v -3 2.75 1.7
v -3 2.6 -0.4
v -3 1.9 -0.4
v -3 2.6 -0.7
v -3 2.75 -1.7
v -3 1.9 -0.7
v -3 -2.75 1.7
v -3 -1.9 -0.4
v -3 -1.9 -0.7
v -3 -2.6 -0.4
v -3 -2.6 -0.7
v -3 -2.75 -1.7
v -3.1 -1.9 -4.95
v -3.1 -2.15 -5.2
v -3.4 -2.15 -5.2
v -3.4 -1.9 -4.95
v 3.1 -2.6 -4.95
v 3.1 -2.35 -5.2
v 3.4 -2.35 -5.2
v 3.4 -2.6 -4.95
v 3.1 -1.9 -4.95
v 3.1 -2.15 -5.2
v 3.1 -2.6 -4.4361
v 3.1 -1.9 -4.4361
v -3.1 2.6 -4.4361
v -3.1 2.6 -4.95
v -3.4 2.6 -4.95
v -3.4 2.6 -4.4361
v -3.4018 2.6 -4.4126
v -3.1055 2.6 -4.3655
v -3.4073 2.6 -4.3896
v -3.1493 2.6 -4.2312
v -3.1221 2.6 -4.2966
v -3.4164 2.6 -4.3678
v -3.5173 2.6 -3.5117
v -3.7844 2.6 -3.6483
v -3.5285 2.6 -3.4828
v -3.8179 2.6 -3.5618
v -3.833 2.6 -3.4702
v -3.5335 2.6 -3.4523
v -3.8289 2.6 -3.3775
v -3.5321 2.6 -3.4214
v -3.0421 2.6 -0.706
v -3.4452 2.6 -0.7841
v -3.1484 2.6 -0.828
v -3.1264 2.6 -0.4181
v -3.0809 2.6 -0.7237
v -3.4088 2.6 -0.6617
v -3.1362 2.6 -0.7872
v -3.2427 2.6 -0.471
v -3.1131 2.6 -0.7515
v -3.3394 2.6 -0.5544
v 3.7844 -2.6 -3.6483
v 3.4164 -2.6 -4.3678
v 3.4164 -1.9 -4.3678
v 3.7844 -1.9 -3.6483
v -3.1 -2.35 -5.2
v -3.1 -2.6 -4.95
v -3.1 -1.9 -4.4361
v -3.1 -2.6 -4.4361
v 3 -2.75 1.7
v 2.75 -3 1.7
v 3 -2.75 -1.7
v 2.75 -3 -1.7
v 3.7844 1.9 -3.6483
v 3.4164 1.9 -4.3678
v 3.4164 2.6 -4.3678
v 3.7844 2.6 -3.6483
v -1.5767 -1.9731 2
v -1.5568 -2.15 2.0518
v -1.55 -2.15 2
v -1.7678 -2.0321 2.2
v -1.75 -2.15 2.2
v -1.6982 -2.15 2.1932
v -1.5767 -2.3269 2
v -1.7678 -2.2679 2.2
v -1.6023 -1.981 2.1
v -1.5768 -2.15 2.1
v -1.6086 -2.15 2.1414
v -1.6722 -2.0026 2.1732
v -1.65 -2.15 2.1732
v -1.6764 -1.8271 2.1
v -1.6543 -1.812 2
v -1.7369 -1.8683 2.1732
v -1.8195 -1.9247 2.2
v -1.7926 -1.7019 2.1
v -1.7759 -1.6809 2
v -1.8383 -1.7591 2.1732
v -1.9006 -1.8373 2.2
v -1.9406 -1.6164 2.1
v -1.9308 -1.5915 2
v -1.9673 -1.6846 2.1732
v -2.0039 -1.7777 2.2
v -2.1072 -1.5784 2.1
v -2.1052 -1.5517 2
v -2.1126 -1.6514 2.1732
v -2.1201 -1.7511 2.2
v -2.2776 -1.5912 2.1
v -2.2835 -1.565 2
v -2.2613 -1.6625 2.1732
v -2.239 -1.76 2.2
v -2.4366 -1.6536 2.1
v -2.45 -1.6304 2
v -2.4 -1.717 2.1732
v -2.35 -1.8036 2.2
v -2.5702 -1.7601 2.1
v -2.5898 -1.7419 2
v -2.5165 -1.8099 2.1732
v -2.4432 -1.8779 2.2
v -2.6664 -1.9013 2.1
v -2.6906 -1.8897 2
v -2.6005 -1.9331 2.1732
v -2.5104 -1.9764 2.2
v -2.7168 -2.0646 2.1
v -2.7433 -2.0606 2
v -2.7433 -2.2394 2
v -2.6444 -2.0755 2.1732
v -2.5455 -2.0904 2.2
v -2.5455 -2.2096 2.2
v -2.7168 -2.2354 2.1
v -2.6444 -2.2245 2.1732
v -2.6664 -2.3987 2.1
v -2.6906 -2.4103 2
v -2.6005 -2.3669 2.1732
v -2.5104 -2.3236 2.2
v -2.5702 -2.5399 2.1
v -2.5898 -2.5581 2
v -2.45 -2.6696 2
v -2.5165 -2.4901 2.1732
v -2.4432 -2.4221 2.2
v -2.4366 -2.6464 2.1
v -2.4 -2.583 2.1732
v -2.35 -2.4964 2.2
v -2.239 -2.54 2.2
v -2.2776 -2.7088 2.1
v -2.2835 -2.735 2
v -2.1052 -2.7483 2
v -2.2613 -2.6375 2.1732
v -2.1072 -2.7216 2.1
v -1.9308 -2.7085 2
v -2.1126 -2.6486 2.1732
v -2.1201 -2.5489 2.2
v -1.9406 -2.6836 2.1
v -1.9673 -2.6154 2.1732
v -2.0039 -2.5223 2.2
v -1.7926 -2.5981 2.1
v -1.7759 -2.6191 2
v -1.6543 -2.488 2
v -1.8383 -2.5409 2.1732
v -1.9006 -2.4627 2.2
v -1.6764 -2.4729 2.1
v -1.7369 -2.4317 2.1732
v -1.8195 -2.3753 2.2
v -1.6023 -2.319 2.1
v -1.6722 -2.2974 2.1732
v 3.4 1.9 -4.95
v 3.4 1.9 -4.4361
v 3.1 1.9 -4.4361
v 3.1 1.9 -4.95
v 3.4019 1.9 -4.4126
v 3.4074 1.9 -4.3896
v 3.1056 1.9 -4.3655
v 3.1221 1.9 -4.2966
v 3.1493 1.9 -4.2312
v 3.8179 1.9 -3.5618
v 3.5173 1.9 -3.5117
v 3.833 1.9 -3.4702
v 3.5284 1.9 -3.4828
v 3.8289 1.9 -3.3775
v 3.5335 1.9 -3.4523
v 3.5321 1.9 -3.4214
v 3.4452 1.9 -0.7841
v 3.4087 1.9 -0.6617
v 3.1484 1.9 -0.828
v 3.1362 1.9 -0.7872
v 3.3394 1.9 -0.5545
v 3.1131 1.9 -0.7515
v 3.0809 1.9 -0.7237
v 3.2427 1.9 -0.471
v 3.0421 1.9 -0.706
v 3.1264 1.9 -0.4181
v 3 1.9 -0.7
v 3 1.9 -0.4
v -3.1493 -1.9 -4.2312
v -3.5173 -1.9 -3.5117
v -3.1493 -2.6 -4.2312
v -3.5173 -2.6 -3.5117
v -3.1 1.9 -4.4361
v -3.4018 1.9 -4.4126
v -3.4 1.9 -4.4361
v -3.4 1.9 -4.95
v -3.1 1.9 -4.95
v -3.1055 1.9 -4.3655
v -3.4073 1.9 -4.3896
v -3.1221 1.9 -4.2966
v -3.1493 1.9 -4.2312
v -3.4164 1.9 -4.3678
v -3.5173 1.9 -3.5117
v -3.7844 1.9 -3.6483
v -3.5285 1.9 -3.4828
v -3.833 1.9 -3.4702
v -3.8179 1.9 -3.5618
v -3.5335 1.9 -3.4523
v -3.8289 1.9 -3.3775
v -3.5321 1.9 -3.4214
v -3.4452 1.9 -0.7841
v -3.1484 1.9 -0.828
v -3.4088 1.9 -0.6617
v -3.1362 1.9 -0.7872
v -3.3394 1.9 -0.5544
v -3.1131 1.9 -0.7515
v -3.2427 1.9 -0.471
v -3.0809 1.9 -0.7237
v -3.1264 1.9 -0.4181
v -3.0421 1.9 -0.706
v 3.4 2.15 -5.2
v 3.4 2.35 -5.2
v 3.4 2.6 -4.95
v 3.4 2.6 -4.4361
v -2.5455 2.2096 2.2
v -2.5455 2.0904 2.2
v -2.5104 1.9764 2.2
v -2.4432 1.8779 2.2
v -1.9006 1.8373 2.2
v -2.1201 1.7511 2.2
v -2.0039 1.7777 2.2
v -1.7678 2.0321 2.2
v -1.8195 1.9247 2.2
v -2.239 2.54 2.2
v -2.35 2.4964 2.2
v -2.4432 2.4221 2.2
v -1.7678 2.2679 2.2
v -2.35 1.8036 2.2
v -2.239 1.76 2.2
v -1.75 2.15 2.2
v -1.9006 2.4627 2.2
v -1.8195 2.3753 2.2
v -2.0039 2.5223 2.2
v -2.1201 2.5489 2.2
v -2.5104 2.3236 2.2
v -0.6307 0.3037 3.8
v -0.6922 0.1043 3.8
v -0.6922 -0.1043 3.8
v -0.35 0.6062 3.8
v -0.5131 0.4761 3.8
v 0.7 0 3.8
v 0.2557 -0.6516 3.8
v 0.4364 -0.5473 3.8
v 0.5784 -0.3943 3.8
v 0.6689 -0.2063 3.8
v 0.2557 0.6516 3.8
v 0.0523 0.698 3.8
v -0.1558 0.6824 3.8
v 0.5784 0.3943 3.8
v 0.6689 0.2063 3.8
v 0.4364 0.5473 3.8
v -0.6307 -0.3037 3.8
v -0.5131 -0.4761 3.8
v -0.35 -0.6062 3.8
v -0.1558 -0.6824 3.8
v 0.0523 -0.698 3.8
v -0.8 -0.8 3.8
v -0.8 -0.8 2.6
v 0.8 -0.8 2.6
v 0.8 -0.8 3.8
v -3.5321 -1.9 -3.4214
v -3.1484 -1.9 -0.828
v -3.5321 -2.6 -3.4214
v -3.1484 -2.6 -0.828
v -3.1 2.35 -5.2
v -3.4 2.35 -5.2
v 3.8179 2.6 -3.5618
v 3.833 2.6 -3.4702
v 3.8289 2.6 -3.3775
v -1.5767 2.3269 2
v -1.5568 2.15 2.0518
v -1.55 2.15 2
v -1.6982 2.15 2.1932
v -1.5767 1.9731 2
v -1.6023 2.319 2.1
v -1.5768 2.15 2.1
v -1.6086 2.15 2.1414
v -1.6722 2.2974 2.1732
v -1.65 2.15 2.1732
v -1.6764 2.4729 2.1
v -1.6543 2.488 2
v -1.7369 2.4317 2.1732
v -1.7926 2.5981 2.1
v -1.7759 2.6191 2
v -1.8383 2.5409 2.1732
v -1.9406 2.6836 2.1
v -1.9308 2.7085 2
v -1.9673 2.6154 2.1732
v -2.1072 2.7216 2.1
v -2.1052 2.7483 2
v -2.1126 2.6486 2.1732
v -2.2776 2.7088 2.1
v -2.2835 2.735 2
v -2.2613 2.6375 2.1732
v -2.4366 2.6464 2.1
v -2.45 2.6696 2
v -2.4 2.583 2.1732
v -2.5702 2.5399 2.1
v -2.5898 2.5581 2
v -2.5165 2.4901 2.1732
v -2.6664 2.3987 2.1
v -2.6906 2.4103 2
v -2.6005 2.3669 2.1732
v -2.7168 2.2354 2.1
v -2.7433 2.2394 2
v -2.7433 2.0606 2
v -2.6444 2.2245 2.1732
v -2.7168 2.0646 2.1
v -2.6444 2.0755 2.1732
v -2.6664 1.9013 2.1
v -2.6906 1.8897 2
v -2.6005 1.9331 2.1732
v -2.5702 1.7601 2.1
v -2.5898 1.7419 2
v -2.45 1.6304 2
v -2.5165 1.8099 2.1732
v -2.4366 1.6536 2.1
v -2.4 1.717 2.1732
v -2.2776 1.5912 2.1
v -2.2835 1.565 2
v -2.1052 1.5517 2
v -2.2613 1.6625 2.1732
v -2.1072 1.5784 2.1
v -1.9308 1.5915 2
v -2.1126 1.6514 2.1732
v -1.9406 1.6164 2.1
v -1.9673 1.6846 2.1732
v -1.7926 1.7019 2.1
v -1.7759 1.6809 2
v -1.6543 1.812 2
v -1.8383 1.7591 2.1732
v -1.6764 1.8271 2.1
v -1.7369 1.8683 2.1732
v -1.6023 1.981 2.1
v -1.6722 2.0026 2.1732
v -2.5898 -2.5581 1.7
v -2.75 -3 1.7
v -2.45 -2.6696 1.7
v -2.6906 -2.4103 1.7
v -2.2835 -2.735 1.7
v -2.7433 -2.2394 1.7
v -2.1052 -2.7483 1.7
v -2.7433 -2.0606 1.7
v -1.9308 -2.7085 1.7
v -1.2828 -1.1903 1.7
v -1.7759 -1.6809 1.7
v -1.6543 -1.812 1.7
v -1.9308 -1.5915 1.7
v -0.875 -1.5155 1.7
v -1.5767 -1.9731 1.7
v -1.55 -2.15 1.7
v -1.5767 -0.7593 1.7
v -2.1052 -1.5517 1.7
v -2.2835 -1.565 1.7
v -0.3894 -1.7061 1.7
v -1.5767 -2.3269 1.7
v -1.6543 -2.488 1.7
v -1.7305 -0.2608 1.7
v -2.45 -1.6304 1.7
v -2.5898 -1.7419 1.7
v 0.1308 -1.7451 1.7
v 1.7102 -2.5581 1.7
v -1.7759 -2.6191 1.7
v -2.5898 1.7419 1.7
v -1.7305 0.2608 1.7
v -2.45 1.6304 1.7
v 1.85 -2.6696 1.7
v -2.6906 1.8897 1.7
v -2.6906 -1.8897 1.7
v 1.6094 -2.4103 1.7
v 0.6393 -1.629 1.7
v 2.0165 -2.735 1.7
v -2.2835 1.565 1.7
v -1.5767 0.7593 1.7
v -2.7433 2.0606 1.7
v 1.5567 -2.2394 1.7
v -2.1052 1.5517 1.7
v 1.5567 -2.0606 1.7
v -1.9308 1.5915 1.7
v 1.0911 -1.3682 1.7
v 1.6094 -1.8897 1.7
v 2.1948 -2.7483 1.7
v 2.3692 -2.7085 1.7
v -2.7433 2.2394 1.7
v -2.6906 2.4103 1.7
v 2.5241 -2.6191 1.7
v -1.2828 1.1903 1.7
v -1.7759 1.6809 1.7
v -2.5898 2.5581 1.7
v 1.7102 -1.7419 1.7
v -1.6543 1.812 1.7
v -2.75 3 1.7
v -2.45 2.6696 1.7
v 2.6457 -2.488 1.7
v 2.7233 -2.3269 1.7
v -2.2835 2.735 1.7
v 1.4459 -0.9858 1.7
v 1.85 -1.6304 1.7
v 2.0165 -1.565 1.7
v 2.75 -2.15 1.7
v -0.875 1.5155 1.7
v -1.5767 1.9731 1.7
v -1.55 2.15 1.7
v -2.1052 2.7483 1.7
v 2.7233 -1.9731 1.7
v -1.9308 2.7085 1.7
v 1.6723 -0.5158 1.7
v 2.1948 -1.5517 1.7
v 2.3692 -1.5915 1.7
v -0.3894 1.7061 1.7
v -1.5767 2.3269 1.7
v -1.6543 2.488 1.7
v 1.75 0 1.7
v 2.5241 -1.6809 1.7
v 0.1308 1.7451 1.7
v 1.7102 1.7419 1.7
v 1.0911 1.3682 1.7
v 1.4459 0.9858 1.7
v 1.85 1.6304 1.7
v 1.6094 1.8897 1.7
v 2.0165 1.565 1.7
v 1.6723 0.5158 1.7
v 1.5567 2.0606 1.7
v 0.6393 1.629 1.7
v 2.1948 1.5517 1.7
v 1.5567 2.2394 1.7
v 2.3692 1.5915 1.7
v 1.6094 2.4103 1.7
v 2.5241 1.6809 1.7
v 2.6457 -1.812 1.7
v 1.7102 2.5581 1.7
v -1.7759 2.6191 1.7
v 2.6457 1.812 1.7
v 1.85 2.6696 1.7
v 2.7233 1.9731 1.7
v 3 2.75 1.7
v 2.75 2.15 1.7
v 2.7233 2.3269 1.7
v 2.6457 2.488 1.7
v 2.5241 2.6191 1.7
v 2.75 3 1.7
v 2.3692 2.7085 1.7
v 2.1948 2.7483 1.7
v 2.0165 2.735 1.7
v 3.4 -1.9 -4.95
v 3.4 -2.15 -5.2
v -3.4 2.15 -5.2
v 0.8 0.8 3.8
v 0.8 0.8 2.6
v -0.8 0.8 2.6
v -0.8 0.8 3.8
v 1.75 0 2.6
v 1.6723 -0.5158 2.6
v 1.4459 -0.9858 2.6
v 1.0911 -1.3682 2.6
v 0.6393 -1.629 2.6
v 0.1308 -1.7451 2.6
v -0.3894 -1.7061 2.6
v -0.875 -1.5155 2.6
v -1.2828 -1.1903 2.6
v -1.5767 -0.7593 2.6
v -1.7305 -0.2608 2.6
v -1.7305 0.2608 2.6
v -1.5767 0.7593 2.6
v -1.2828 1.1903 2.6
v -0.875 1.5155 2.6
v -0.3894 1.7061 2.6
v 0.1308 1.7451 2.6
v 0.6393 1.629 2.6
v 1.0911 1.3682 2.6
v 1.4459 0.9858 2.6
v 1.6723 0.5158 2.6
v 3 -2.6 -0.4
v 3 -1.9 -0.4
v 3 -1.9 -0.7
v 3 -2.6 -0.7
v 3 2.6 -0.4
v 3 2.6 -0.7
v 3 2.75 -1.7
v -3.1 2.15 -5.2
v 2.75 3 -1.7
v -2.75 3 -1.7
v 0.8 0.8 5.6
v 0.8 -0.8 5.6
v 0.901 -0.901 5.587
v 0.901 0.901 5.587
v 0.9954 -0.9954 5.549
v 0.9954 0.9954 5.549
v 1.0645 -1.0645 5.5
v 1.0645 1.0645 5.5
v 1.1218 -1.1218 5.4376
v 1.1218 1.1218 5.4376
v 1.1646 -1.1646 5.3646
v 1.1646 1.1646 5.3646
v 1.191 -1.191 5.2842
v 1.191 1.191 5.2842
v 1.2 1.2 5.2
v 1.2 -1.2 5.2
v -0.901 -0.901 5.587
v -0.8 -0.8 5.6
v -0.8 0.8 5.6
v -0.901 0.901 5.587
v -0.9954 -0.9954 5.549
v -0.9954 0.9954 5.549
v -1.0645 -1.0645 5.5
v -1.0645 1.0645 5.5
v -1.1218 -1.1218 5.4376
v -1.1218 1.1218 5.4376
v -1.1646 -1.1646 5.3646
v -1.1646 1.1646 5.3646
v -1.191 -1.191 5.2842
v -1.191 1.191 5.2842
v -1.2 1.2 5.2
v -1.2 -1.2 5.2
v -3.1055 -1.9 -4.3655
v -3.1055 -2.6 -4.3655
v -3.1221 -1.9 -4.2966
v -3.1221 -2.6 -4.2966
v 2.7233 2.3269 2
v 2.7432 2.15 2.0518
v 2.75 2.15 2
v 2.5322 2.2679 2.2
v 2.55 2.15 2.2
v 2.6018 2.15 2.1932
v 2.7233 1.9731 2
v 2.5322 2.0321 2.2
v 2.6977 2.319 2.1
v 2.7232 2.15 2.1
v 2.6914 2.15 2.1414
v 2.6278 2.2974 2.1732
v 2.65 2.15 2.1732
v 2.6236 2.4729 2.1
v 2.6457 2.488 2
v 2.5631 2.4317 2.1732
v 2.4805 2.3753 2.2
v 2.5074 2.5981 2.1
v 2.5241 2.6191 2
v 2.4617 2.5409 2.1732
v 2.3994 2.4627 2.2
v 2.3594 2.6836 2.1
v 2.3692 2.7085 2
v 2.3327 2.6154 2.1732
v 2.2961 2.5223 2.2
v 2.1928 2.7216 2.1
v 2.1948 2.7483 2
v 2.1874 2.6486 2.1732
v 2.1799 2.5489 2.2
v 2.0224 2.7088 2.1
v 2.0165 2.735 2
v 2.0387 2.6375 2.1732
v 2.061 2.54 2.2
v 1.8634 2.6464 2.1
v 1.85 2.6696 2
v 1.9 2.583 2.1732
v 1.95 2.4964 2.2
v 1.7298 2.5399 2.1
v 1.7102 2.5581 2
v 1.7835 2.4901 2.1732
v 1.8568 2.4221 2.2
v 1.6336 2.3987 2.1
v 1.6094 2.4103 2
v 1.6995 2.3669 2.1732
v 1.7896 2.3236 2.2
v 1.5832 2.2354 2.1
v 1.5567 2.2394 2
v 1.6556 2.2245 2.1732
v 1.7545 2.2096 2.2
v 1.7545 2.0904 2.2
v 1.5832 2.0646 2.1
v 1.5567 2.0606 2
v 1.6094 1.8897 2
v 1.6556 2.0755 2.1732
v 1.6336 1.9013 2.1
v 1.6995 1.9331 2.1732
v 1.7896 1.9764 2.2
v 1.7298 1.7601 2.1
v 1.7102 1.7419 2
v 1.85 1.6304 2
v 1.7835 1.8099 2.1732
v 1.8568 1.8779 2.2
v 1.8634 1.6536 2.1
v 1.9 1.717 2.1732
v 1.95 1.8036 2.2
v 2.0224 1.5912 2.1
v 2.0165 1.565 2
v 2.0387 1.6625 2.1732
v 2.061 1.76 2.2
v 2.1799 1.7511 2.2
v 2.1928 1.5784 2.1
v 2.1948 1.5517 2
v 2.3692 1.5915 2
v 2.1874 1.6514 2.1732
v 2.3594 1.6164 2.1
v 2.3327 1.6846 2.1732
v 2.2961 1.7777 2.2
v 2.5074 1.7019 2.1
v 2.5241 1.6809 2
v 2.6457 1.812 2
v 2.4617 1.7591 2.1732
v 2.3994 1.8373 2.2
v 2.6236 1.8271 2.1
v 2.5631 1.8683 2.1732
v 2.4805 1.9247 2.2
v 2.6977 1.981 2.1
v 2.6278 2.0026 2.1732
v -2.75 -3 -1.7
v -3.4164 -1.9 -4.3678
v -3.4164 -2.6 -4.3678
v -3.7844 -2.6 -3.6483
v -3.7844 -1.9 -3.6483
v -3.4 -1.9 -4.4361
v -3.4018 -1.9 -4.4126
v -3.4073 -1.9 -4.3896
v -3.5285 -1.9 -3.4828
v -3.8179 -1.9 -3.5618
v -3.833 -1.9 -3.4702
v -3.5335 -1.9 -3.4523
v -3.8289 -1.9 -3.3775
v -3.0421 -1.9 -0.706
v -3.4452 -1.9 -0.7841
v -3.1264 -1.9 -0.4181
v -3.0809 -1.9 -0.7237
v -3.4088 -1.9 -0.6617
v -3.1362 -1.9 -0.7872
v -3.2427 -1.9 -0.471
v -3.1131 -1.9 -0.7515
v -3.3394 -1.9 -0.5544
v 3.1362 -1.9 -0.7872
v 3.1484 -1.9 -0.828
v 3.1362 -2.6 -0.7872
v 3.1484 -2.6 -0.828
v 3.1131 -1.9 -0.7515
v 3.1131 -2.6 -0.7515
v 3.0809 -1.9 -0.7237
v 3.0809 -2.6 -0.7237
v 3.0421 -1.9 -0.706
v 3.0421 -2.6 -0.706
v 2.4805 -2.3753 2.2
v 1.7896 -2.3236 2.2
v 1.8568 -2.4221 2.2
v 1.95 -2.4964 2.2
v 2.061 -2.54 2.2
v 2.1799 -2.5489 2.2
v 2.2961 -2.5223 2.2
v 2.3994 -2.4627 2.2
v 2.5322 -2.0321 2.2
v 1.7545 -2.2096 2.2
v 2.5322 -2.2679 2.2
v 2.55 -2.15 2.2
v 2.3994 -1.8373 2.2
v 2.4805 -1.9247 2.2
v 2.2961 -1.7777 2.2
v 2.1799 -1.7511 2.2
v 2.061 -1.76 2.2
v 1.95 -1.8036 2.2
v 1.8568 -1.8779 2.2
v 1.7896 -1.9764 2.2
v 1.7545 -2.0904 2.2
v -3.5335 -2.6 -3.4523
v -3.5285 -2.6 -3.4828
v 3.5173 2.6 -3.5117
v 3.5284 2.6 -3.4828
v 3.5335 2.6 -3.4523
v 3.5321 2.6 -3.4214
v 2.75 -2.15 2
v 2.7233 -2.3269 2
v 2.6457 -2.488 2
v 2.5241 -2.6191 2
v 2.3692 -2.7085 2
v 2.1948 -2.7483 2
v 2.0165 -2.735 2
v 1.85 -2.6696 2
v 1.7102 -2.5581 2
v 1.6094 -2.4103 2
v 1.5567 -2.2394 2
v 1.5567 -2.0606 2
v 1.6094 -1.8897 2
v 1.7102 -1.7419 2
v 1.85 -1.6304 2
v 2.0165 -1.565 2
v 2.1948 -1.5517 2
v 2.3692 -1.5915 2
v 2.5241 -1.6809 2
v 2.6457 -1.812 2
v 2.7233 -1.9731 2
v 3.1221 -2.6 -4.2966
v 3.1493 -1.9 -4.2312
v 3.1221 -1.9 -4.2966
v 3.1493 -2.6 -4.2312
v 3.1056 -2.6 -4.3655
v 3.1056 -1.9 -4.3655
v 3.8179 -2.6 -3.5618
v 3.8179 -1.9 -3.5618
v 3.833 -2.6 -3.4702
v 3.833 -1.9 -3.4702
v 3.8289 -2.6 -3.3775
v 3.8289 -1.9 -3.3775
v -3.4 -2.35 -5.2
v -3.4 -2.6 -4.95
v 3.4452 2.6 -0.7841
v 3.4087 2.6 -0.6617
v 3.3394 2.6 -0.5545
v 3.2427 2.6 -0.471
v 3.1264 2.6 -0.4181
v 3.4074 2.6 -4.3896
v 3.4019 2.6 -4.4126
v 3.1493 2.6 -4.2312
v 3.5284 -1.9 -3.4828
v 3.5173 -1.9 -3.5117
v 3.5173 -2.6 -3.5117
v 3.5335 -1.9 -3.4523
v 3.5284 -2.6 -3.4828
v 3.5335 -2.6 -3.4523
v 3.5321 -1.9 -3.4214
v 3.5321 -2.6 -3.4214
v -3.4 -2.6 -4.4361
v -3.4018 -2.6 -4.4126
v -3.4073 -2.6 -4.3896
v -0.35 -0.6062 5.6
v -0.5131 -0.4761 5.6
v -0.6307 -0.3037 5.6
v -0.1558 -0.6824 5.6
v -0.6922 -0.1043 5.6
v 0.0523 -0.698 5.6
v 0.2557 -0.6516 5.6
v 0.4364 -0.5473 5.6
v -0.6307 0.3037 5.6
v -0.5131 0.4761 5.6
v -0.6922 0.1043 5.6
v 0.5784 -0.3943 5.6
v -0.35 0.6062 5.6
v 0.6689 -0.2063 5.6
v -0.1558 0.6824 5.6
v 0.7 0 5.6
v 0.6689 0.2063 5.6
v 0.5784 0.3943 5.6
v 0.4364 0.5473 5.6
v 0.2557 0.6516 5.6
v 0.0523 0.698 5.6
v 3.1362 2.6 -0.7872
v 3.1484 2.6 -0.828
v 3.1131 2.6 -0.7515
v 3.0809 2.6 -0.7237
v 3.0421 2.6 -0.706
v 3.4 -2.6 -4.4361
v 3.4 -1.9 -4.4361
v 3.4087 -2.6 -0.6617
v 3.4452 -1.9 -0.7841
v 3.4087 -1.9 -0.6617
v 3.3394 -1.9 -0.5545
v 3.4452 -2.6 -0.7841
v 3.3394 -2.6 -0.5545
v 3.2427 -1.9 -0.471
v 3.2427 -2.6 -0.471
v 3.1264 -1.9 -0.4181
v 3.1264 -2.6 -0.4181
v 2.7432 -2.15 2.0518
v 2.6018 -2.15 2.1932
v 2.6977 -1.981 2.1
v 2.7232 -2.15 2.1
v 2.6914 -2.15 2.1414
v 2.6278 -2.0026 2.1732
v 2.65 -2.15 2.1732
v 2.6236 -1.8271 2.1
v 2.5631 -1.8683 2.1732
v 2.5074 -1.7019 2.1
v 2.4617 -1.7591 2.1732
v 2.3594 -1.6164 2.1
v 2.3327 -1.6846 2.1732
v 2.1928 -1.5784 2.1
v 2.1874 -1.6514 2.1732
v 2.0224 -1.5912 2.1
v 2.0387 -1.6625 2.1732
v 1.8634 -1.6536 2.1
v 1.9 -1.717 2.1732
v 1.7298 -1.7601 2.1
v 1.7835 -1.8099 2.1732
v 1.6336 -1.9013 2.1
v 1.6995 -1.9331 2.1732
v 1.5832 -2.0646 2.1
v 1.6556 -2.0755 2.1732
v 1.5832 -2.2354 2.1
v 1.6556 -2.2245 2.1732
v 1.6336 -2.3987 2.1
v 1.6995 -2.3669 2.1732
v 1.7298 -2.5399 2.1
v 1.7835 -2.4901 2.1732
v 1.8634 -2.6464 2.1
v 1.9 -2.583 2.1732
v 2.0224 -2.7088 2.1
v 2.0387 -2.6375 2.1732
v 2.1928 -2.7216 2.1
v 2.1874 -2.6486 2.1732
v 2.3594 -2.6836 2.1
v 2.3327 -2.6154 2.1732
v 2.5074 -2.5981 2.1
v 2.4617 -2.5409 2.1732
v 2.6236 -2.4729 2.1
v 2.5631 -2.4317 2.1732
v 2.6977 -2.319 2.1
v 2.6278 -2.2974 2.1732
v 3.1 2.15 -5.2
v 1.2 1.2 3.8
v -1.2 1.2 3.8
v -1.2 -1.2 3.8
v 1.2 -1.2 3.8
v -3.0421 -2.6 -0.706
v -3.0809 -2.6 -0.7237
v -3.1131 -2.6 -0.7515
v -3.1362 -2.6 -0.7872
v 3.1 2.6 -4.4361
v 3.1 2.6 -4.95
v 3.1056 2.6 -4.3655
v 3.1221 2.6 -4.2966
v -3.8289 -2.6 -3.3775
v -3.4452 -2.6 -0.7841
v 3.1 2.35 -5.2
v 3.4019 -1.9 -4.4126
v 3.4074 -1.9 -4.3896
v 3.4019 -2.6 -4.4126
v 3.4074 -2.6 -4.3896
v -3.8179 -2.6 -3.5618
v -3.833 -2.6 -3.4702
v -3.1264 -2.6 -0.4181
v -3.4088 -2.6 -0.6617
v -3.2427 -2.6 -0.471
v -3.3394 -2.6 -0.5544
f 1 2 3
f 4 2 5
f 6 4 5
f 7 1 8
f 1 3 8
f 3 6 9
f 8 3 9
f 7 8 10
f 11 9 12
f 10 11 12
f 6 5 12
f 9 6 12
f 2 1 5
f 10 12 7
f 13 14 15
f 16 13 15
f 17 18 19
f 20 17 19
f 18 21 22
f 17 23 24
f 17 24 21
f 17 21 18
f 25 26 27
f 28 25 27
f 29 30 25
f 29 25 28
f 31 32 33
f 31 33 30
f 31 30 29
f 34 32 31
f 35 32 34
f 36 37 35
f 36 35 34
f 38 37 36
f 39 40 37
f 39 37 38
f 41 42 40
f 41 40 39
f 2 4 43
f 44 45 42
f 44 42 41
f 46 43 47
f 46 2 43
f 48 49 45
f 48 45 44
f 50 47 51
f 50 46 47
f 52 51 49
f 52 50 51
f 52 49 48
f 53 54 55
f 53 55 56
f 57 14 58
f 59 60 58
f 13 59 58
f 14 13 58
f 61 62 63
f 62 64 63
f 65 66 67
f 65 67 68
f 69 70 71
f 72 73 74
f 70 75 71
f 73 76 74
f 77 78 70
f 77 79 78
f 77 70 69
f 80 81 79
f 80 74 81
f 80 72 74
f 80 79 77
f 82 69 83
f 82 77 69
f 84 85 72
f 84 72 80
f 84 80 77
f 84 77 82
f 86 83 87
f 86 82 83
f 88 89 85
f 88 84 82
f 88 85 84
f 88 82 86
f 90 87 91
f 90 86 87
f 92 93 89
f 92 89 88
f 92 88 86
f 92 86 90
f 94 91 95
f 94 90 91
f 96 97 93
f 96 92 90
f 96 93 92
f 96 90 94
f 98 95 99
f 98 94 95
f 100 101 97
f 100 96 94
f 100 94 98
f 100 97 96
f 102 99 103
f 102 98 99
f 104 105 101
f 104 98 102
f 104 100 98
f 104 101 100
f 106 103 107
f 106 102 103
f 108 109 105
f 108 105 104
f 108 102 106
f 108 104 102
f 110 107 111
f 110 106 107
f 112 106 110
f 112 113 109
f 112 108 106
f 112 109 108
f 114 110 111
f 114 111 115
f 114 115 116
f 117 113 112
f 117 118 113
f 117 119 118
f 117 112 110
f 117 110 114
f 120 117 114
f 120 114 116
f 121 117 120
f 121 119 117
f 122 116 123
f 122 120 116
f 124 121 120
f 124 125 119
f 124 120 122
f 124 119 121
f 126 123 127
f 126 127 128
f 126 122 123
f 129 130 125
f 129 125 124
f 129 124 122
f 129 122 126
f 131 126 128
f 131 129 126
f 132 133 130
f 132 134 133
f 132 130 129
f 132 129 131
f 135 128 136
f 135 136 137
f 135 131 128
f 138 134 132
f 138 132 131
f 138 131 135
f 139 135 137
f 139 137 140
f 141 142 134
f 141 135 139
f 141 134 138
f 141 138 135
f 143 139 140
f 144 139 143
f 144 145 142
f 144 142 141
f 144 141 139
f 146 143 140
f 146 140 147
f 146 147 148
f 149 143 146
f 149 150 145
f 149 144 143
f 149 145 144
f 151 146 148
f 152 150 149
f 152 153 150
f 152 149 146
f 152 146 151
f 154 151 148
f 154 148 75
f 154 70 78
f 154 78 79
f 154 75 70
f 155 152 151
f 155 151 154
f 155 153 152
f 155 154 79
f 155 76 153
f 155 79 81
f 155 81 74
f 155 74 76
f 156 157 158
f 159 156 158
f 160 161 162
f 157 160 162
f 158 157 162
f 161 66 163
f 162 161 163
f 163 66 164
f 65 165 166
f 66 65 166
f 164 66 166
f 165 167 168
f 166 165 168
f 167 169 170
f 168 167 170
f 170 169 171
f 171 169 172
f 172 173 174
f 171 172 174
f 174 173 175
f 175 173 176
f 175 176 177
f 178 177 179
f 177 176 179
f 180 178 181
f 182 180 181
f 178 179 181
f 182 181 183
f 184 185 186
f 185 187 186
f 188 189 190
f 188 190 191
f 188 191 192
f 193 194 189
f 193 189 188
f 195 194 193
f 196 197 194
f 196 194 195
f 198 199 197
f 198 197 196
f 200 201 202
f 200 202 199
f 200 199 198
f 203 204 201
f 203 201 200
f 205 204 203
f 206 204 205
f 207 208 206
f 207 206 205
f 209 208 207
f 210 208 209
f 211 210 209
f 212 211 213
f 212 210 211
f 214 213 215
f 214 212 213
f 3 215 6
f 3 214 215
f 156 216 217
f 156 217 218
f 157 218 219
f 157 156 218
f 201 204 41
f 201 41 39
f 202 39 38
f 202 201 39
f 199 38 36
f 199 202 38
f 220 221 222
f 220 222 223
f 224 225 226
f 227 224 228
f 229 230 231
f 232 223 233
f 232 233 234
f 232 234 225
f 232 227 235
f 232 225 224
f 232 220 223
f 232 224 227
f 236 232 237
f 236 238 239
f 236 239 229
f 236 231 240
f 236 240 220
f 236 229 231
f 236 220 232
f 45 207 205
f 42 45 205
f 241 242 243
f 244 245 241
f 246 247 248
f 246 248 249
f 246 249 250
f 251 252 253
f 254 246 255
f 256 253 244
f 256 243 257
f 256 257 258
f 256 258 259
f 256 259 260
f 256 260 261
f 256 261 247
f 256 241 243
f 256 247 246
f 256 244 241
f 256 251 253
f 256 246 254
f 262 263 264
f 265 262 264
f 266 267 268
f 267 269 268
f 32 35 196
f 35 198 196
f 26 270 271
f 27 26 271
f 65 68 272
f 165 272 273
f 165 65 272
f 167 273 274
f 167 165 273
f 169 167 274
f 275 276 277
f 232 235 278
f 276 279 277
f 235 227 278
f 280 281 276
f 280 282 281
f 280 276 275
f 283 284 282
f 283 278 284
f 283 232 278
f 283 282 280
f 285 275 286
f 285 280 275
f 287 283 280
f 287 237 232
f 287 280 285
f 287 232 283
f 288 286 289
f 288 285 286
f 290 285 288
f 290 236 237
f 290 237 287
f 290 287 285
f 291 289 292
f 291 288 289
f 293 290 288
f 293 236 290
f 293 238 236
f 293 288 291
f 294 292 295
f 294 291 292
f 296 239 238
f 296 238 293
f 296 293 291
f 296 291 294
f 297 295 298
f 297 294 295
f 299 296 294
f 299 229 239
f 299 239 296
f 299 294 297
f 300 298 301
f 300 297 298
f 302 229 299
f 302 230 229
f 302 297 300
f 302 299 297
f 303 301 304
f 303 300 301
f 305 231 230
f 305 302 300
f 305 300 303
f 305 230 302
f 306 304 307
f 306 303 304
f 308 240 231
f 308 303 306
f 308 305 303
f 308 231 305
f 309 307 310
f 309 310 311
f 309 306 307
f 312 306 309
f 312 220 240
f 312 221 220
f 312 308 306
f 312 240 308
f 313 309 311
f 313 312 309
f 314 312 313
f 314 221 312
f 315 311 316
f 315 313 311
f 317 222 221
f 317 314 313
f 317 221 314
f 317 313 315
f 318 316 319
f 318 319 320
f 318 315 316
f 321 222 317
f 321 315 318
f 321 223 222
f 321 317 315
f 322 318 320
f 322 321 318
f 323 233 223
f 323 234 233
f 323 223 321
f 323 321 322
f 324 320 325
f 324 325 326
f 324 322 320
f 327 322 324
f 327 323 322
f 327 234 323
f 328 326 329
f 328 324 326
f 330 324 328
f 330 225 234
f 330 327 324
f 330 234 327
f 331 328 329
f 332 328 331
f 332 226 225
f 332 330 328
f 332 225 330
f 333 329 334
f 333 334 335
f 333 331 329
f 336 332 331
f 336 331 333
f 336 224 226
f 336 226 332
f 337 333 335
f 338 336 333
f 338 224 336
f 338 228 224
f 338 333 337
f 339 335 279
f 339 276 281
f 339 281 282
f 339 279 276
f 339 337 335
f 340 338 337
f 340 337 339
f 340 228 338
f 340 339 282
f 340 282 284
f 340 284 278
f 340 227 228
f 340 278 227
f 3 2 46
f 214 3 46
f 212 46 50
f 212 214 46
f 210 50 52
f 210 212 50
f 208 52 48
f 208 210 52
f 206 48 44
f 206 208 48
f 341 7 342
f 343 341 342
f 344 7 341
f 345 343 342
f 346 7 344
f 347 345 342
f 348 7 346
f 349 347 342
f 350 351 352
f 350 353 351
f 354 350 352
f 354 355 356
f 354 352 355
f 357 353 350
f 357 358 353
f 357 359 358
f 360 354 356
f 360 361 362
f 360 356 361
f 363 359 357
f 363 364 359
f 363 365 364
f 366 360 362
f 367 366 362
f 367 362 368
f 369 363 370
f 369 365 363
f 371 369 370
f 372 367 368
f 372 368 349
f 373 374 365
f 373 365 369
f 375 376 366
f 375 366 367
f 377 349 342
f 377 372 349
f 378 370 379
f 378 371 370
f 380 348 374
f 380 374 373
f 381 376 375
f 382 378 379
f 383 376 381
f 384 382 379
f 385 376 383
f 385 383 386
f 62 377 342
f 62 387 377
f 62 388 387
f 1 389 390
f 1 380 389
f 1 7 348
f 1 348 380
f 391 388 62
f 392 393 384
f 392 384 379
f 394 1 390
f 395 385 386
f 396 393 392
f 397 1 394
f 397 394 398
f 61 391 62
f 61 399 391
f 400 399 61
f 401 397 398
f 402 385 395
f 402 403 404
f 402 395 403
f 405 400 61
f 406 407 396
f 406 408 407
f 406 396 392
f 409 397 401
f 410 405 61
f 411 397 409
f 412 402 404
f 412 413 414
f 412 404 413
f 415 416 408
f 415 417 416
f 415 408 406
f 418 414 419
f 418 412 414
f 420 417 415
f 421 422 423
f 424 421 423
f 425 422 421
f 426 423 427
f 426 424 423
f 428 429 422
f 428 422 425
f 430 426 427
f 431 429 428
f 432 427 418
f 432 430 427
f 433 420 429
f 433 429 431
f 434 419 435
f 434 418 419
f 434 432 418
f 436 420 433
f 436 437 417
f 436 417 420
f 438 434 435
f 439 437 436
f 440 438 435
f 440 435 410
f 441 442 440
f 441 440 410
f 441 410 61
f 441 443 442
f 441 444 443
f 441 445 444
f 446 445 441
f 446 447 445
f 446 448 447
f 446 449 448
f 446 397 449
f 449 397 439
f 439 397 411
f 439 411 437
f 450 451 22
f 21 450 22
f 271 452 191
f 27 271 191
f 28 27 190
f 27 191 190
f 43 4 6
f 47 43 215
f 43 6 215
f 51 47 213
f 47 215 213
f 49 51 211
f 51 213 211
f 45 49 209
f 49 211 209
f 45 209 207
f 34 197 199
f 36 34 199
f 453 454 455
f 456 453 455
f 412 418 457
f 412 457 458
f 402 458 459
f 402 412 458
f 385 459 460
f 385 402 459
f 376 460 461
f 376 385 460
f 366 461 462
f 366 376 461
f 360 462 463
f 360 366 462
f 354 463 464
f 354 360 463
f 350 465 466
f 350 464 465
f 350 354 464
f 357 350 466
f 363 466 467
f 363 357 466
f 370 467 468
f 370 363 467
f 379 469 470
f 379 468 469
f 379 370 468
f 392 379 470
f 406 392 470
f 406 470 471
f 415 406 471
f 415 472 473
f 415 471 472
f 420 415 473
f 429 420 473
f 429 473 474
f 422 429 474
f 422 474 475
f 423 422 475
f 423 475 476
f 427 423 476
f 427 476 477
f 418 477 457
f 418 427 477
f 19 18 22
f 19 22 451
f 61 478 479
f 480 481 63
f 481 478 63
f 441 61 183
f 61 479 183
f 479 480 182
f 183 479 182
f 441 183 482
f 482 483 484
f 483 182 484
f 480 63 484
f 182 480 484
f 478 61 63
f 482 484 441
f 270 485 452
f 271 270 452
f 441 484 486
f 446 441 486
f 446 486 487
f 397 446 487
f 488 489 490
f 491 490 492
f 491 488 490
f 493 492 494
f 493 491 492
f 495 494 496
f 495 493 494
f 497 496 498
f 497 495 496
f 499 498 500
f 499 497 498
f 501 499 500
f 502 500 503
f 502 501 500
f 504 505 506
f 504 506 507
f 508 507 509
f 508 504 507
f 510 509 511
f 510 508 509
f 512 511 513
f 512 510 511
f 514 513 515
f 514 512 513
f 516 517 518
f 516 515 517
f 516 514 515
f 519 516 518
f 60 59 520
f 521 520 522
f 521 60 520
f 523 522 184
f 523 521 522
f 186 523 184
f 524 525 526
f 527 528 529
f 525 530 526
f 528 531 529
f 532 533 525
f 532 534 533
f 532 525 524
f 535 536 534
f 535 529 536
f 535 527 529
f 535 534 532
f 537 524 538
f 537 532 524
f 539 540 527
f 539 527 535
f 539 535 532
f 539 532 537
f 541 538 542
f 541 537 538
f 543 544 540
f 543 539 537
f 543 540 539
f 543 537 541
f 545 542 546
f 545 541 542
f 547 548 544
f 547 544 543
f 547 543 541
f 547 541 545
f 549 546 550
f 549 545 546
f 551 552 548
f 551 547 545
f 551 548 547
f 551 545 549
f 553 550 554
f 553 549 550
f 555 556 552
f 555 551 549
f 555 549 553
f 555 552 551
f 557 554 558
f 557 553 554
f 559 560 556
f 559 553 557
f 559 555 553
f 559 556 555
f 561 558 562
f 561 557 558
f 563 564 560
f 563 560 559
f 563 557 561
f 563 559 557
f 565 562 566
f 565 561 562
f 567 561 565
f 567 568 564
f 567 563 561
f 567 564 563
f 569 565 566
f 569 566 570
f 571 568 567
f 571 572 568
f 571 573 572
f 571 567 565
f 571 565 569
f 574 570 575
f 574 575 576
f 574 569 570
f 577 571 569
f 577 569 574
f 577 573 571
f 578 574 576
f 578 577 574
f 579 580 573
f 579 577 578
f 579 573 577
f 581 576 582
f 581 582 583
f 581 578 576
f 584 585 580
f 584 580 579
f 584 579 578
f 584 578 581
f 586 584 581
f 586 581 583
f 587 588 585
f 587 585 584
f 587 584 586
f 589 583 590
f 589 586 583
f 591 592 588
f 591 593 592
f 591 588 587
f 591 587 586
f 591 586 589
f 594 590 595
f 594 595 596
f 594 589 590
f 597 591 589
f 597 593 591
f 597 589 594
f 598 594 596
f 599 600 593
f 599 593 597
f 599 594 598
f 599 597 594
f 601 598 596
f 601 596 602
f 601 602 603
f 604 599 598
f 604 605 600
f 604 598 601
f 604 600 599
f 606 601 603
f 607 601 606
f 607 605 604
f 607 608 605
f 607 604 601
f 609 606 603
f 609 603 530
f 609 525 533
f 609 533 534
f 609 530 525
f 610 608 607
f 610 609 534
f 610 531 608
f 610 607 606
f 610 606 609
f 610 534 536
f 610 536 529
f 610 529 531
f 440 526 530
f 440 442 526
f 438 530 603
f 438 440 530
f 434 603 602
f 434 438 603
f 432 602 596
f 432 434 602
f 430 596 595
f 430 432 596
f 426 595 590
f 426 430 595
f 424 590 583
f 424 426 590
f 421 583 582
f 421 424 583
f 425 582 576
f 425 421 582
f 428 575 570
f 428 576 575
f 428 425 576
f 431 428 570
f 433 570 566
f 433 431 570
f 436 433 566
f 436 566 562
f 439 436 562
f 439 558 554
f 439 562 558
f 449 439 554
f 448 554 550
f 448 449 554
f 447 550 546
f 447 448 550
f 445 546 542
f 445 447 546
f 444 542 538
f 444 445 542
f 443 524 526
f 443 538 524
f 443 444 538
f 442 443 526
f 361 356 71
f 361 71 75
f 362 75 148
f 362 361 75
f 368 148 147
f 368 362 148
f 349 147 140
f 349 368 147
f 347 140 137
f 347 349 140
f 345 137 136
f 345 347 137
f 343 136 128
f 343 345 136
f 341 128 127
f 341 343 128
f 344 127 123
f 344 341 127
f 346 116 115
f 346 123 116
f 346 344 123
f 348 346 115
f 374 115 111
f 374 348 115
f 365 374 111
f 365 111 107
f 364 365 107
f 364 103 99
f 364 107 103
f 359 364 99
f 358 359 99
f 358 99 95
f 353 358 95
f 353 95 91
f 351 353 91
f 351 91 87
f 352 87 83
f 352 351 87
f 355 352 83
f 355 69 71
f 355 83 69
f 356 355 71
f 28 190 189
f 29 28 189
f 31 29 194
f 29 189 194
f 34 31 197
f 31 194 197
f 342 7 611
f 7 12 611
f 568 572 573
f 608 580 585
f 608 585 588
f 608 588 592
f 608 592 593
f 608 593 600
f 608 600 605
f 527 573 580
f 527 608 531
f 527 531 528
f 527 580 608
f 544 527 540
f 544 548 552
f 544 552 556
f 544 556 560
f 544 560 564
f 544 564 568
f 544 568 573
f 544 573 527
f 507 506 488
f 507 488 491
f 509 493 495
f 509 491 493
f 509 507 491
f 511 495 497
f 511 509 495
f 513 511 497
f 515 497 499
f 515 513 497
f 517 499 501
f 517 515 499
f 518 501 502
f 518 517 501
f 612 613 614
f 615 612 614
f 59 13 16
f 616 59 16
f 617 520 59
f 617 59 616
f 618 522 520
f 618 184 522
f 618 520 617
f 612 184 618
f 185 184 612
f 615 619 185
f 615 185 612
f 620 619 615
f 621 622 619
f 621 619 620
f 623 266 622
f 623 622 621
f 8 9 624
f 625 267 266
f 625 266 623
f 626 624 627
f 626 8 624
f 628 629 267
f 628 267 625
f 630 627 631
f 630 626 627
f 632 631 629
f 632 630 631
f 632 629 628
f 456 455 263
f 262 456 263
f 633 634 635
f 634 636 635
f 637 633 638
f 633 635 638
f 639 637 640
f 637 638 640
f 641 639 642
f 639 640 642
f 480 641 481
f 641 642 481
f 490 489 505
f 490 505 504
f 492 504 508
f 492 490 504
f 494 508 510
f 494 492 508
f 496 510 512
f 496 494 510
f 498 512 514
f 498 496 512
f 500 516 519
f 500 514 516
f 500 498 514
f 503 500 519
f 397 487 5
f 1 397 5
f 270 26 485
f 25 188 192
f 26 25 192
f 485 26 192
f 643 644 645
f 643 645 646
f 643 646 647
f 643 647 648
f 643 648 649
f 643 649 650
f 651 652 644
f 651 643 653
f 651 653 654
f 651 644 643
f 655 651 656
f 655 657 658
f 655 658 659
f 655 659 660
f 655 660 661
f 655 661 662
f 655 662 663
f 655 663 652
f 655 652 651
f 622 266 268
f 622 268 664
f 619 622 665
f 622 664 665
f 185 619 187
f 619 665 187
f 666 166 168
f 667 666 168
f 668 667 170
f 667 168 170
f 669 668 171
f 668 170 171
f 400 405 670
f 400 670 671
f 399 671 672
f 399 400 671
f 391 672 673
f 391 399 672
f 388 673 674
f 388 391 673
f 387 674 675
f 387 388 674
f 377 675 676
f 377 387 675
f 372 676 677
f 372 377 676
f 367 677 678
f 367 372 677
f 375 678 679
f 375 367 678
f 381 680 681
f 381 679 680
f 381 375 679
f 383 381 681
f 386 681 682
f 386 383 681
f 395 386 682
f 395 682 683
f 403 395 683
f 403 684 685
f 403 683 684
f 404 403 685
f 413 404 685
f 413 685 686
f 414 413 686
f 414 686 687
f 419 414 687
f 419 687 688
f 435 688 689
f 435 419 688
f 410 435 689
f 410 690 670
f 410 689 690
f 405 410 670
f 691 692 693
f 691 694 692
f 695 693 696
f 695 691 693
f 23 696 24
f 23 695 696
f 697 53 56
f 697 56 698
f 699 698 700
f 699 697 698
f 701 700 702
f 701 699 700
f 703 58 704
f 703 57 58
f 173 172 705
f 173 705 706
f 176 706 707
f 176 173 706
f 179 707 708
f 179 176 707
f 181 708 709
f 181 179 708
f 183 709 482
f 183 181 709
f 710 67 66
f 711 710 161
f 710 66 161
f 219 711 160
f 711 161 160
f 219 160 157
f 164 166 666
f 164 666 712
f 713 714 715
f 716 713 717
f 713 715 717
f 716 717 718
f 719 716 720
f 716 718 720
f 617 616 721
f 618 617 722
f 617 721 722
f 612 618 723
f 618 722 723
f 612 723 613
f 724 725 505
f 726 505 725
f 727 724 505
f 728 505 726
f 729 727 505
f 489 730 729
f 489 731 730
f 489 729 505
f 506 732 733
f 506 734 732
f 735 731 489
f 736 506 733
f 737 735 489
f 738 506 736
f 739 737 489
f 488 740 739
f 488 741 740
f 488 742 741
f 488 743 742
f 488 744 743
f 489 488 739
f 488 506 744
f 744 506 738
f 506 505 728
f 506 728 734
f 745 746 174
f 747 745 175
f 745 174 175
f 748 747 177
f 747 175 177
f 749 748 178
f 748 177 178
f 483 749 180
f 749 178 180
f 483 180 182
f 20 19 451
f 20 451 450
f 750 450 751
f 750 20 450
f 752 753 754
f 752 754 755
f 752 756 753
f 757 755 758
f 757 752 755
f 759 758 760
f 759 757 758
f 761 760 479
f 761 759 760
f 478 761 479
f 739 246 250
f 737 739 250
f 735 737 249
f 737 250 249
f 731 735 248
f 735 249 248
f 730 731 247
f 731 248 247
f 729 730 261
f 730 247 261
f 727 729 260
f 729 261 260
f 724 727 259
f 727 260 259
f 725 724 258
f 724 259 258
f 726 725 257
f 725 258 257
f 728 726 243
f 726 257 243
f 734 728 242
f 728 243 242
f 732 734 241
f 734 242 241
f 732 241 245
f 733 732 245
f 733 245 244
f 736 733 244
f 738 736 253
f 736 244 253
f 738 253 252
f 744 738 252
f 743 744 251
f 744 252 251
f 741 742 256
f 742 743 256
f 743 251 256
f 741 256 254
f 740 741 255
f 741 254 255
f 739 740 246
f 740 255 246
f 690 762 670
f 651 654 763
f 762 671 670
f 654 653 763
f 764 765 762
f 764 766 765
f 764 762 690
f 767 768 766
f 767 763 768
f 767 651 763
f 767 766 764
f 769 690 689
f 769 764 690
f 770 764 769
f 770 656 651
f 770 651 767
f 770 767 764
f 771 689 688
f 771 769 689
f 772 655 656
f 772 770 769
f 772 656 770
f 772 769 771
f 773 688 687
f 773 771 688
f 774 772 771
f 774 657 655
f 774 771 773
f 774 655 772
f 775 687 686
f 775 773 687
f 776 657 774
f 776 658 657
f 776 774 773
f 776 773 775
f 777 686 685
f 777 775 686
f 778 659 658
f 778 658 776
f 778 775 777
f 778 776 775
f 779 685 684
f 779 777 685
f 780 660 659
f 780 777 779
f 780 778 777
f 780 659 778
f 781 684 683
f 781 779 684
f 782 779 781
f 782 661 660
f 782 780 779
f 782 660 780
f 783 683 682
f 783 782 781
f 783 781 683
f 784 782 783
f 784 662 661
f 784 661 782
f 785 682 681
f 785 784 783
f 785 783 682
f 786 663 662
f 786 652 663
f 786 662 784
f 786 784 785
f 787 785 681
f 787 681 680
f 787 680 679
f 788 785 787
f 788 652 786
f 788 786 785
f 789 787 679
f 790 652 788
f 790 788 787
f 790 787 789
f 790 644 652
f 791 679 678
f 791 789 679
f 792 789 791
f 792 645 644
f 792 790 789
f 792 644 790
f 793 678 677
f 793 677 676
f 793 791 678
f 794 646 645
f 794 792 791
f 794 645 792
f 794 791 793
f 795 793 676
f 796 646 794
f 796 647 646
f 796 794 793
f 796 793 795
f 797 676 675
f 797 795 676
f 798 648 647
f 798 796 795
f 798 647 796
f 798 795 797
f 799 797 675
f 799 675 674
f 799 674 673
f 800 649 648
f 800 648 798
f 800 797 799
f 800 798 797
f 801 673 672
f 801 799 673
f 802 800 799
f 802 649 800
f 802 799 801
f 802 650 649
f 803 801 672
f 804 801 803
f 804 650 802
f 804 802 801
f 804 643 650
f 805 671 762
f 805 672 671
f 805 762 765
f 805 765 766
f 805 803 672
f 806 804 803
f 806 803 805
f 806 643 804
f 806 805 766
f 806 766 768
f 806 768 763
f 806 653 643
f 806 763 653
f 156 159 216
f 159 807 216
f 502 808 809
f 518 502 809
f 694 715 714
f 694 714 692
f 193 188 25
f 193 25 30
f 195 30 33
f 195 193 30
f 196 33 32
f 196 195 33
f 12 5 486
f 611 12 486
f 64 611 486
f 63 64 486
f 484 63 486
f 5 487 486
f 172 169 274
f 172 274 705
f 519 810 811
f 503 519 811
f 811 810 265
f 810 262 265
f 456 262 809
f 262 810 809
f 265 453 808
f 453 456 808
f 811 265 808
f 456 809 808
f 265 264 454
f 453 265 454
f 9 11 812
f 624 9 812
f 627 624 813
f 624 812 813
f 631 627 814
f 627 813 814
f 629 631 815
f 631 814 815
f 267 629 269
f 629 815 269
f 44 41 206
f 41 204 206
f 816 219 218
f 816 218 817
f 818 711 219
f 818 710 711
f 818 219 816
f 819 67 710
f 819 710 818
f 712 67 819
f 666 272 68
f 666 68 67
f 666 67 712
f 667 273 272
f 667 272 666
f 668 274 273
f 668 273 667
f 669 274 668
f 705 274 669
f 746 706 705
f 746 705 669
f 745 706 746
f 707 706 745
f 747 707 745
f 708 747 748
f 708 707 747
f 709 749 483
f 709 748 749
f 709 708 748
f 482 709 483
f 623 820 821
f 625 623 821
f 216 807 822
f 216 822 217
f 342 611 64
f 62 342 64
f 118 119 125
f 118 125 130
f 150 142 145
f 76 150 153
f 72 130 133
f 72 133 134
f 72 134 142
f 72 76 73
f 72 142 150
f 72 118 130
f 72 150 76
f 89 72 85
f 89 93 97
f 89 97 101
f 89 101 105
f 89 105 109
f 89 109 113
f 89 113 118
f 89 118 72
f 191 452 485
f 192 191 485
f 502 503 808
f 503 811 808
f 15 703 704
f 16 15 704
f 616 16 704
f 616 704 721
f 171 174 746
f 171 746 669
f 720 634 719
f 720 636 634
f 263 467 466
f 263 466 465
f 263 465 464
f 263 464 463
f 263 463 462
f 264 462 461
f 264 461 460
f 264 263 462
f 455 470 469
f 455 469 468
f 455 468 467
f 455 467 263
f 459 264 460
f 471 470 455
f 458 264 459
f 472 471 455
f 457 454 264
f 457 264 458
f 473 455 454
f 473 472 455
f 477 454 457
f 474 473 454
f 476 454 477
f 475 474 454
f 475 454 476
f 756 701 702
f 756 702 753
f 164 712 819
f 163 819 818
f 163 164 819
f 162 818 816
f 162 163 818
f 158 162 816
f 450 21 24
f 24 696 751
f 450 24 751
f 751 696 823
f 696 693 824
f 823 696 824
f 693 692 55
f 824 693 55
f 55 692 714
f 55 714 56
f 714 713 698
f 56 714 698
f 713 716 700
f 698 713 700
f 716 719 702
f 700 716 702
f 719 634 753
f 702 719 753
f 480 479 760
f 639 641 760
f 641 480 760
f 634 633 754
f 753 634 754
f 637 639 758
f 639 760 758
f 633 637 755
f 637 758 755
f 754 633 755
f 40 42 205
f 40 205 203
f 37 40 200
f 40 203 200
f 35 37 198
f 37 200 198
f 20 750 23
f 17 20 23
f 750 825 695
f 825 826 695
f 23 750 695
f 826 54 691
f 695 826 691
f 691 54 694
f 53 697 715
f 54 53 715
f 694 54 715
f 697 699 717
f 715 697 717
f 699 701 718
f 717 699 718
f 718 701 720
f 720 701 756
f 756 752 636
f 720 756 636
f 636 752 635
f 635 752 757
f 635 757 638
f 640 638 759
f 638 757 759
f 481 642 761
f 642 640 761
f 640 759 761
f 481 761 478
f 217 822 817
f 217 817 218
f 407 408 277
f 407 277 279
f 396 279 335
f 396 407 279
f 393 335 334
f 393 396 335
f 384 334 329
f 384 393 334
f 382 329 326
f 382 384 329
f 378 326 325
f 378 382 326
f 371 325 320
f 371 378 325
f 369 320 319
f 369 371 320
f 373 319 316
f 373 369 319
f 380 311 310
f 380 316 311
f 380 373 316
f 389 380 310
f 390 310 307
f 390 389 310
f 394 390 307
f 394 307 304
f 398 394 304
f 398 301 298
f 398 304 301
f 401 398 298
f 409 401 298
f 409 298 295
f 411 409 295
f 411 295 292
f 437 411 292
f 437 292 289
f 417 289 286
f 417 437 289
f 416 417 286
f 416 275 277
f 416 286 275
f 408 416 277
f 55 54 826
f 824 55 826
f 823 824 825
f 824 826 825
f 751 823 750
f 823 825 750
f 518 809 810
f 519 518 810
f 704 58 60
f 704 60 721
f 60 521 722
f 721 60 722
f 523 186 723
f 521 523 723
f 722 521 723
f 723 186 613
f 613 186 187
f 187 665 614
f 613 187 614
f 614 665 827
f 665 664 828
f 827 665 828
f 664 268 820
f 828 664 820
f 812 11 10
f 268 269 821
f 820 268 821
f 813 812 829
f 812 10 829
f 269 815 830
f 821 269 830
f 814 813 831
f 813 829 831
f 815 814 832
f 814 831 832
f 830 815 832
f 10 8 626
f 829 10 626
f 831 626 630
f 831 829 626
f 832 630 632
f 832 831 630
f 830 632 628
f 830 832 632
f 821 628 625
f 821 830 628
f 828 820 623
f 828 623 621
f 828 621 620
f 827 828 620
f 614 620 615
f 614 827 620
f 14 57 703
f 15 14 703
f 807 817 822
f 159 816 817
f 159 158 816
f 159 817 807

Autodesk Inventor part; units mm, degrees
ref_plane "YZ Plane" through (0, 0, 0) normal (1, 0, 0) x (0, 1, 0)
ref_plane "XZ Plane" through (0, 0, 0) normal (0, 1, 0) x (-1, 0, 0)
ref_plane "XY Plane" through (0, 0, 0) normal (0, 0, 1) x (1, 0, 0)
sketch "Sketch1" plane through (0, 0, 0) normal (0, 0, 1) x (1, 0, 0)
  line L0 (-2.75, -3) -> (2.75, -3)
  line L1 (3, -2.75) -> (3, 2.75)
  line L2 (2.75, 3) -> (-2.75, 3)
  line L3 (-3, 2.75) -> (-3, -2.75)
  line L4 (-3, -3) -> (3, 3) construction
  line L5 (3, -3) -> (-3, 3) construction
  line L6 (-2.75, 3) -> (-3, 2.75)
  line L7 (-3, -2.75) -> (-2.75, -3)
  line L8 (2.75, -3) -> (3, -2.75)
  line L9 (3, 2.75) -> (2.75, 3)
  point P0 (0, 0)
  dimension "d0" = 6
  dimension "d1" = 0.25
  dimension "d2" = 0.25
  dimension "d3" = 0.25
  dimension "d4" = 0.25
  dimension "d5" = 0.25
  dimension "d6" = 0.25
  dimension "d7" = 0.25
  dimension "d8" = 0.25
extrude "Extrusion1" add sketch "Sketch1" along normal mid plane 3.4
sketch "Sketch2" plane through (0, 0, 1.7) normal (0, 0, 1) x (1, 0, 0)
  line L0 (-2.15, -2.15) -> (2.15, -2.15) construction
  line L1 (2.15, -2.15) -> (2.15, 2.15) construction
  line L2 (2.15, 2.15) -> (-2.15, 2.15) construction
  line L3 (-2.15, 2.15) -> (-2.15, -2.15) construction
  line L4 (-2.15, -2.15) -> (2.15, 2.15) construction
  line L5 (2.15, -2.15) -> (-2.15, 2.15) construction
  circle A0 centre (-2.15, 2.15) radius 0.6
  circle A1 centre (2.15, 2.15) radius 0.6
  circle A2 centre (2.15, -2.15) radius 0.6
  circle A3 centre (-2.15, -2.15) radius 0.6
  point P0 (0, 0)
  dimension "d11" = 4.3
  dimension "d12" = 1.2
extrude "Extrusion2" add sketch "Sketch2" along normal blind 0.5
sketch "Sketch3" plane through (0, 0, 1.7) normal (0, 0, 1) x (1, 0, 0)
  circle A0 centre (0, 0) radius 1.75
  dimension "d15" = 3.5
extrude "Extrusion3" add sketch "Sketch3" along normal blind 0.9
sketch "Sketch4" plane through (0, 0, 2.6) normal (0, 0, 1) x (1, 0, 0)
  line L0 (-0.8, -0.8) -> (0.8, -0.8)
  line L1 (0.8, -0.8) -> (0.8, 0.8)
  line L2 (0.8, 0.8) -> (-0.8, 0.8)
  line L3 (-0.8, 0.8) -> (-0.8, -0.8)
  line L4 (-0.8, -0.8) -> (0.8, 0.8) construction
  line L5 (0.8, -0.8) -> (-0.8, 0.8) construction
  point P0 (0, 0)
  dimension "d18" = 1.6
extrude "Extrusion4" add sketch "Sketch4" along normal blind 1.2
sketch "Sketch5" plane through (0, 0, 3.8) normal (0, 0, 1) x (1, 0, 0)
  circle A0 centre (0, 0) radius 0.7
  line L0 (-1.2, -1.2) -> (1.2, -1.2)
  line L1 (1.2, -1.2) -> (1.2, 1.2)
  line L2 (1.2, 1.2) -> (-1.2, 1.2)
  line L3 (-1.2, 1.2) -> (-1.2, -1.2)
  line L4 (-1.2, -1.2) -> (1.2, 1.2) construction
  line L5 (1.2, -1.2) -> (-1.2, 1.2) construction
  dimension "d21" = 1.4
  dimension "d22" = 2.4
extrude "Extrusion5" add sketch "Sketch5" along normal blind 1.8
fillet "Fillet1" radius 0.4 4 edges at (0, 1.2, 5.6) (-1.2, 0, 5.6) (0, -1.2, 5.6) (1.2, 0, 5.6)
sketch "Sketch6" plane through (0, 0, 0) normal (0, 1, 0) x (-1, 0, 0)
  line L0 (-3, -1.7) -> (-3, 1.7) projected
  line L1 (-3, -1.7) -> (-3, 1.7) projected
  line L2 (-3.1484, -0.828) -> (-3.5321, -3.4214)
  arc A0 (-3.5321, -3.4214) -> (-3.5173, -3.5117) centre (-3.3838, -3.4434) ccw
  line L3 (-3.5173, -3.5117) -> (-3.1493, -4.2312)
  arc A1 (-3.1, -4.4361) -> (-3.1493, -4.2312) centre (-3.55, -4.4361) ccw
  line L4 (-3.1, -4.4361) -> (-3.1, -5.2)
  line L5 (-3.1, -5.2) -> (-3.4, -5.2)
  line L6 (-3.4, -5.2) -> (-3.4, -4.4361)
  arc A2 (-3.4, -4.4361) -> (-3.4164, -4.3678) centre (-3.55, -4.4361) ccw
  line L7 (-3.4164, -4.3678) -> (-3.7844, -3.6483)
  arc A3 (-3.8289, -3.3775) -> (-3.7844, -3.6483) centre (-3.3838, -3.4434) ccw
  line L8 (-3.8289, -3.3775) -> (-3.4452, -0.7841)
  line L9 (-3.8289, -3.3775) -> (-3.85, -3.52) construction
  line L10 (-3.85, -3.52) -> (-3.7844, -3.6483) construction
  line L11 (-3.4, -4.4361) -> (-3.4, -4.4) construction
  line L12 (-3.4, -4.4) -> (-3.4164, -4.3678) construction
  arc A4 (-3, -0.7) -> (-3.1484, -0.828) centre (-3, -0.85) ccw
  arc A5 (-3, -0.4) -> (-3.4452, -0.7841) centre (-3, -0.85) ccw
  line L13 (2.75, -1.7) -> (-2.75, -1.7) projected
  line L14 (0, 0) -> (0, -1.7) construction
  line L15 (-3, -0.4) -> (-3, -0.7)
  line L16 (3.1484, -0.828) -> (3.5321, -3.4214)
  arc A6 (3.5173, -3.5117) -> (3.5321, -3.4214) centre (3.3838, -3.4434) ccw
  line L17 (3.5173, -3.5117) -> (3.1493, -4.2312)
  arc A7 (3.1493, -4.2312) -> (3.1, -4.4361) centre (3.55, -4.4361) ccw
  line L18 (3.1, -4.4361) -> (3.1, -5.2)
  line L19 (3.1, -5.2) -> (3.4, -5.2)
  line L20 (3.4, -5.2) -> (3.4, -4.4361)
  arc A8 (3.4164, -4.3678) -> (3.4, -4.4361) centre (3.55, -4.4361) ccw
  line L21 (3.4164, -4.3678) -> (3.7844, -3.6483)
  arc A9 (3.7844, -3.6483) -> (3.8289, -3.3775) centre (3.3838, -3.4434) ccw
  line L22 (3.8289, -3.3775) -> (3.4452, -0.7841)
  line L23 (3.8289, -3.3775) -> (3.85, -3.52) construction
  line L24 (3.85, -3.52) -> (3.7844, -3.6483) construction
  line L25 (3.4, -4.4361) -> (3.4, -4.4) construction
  line L26 (3.4, -4.4) -> (3.4164, -4.3678) construction
  arc A10 (3.1484, -0.828) -> (3, -0.7) centre (3, -0.85) ccw
  arc A11 (3.4452, -0.7841) -> (3, -0.4) centre (3, -0.85) ccw
  line L27 (3, -0.4) -> (3, -0.7)
  dimension "d26" = 0.3
  dimension "d28" = 3.5
  dimension "d29" = 3.4
  dimension "d30" = 0.15
  dimension "d31" = 3.85
  dimension "d32" = 1.82
  dimension "d33" = 0.8
  dimension "d34" = 1
extrude "Extrusion6" add sketch "Sketch6" along normal mid plane 5.2
sketch "Sketch7" plane through (0, 0, 0) normal (0, 0, 1) x (1, 0, 0)
  line L0 (-3, 2.75) -> (-3, -2.75) projected
  line L1 (-4, 1.9) -> (-3, 1.9)
  line L2 (-3, 1.9) -> (-3, -1.9)
  line L3 (-3, -1.9) -> (-4, -1.9)
  line L4 (-4, -1.9) -> (-4, 1.9)
  line L5 (3, -2.75) -> (3, 2.75) projected
  line L6 (4, 1.9) -> (3, 1.9)
  line L7 (3, 1.9) -> (3, -1.9)
  line L8 (3, -1.9) -> (4, -1.9)
  line L9 (4, -1.9) -> (4, 1.9)
  point P0 (0, 0)
  point P1 (-3.8289, 2.6)
  point P2 (3, 0)
  point P3 (3, 0)
  point P4 (-3, 0)
  dimension "d37" = 0.7
  dimension "d40" = 1
extrude "Extrusion7" cut sketch "Sketch7" against normal through all
chamfer "Chamfer1" distance 0.25 angle 45 8 edges at (-3.25, -2.6, -5.2) (-3.25, -1.9, -5.2) (3.25, -2.6, -5.2) (3.25, -1.9, -5.2) (3.25, 1.9, -5.2) (3.25, 2.6, -5.2) (-3.25, 1.9, -5.2) (-3.25, 2.6, -5.2)
fillet "Fillet2" radius 0.2 4 edges at (-2.75, -2.15, 2.2) (1.55, -2.15, 2.2) (-2.75, 2.15, 2.2) (1.55, 2.15, 2.2)
equation "\"d2\" = d1"
equation "\"d3\" = d1"
equation "\"d4\" = d3"
equation "\"d5\" = d1"
equation "\"d6\" = d5"
equation "\"d7\" = d1"
equation "\"d8\" = d7"
equation "\"d30\" = 0.5 * d26"
properties part number "49-0005" material "ABS Plastic"
